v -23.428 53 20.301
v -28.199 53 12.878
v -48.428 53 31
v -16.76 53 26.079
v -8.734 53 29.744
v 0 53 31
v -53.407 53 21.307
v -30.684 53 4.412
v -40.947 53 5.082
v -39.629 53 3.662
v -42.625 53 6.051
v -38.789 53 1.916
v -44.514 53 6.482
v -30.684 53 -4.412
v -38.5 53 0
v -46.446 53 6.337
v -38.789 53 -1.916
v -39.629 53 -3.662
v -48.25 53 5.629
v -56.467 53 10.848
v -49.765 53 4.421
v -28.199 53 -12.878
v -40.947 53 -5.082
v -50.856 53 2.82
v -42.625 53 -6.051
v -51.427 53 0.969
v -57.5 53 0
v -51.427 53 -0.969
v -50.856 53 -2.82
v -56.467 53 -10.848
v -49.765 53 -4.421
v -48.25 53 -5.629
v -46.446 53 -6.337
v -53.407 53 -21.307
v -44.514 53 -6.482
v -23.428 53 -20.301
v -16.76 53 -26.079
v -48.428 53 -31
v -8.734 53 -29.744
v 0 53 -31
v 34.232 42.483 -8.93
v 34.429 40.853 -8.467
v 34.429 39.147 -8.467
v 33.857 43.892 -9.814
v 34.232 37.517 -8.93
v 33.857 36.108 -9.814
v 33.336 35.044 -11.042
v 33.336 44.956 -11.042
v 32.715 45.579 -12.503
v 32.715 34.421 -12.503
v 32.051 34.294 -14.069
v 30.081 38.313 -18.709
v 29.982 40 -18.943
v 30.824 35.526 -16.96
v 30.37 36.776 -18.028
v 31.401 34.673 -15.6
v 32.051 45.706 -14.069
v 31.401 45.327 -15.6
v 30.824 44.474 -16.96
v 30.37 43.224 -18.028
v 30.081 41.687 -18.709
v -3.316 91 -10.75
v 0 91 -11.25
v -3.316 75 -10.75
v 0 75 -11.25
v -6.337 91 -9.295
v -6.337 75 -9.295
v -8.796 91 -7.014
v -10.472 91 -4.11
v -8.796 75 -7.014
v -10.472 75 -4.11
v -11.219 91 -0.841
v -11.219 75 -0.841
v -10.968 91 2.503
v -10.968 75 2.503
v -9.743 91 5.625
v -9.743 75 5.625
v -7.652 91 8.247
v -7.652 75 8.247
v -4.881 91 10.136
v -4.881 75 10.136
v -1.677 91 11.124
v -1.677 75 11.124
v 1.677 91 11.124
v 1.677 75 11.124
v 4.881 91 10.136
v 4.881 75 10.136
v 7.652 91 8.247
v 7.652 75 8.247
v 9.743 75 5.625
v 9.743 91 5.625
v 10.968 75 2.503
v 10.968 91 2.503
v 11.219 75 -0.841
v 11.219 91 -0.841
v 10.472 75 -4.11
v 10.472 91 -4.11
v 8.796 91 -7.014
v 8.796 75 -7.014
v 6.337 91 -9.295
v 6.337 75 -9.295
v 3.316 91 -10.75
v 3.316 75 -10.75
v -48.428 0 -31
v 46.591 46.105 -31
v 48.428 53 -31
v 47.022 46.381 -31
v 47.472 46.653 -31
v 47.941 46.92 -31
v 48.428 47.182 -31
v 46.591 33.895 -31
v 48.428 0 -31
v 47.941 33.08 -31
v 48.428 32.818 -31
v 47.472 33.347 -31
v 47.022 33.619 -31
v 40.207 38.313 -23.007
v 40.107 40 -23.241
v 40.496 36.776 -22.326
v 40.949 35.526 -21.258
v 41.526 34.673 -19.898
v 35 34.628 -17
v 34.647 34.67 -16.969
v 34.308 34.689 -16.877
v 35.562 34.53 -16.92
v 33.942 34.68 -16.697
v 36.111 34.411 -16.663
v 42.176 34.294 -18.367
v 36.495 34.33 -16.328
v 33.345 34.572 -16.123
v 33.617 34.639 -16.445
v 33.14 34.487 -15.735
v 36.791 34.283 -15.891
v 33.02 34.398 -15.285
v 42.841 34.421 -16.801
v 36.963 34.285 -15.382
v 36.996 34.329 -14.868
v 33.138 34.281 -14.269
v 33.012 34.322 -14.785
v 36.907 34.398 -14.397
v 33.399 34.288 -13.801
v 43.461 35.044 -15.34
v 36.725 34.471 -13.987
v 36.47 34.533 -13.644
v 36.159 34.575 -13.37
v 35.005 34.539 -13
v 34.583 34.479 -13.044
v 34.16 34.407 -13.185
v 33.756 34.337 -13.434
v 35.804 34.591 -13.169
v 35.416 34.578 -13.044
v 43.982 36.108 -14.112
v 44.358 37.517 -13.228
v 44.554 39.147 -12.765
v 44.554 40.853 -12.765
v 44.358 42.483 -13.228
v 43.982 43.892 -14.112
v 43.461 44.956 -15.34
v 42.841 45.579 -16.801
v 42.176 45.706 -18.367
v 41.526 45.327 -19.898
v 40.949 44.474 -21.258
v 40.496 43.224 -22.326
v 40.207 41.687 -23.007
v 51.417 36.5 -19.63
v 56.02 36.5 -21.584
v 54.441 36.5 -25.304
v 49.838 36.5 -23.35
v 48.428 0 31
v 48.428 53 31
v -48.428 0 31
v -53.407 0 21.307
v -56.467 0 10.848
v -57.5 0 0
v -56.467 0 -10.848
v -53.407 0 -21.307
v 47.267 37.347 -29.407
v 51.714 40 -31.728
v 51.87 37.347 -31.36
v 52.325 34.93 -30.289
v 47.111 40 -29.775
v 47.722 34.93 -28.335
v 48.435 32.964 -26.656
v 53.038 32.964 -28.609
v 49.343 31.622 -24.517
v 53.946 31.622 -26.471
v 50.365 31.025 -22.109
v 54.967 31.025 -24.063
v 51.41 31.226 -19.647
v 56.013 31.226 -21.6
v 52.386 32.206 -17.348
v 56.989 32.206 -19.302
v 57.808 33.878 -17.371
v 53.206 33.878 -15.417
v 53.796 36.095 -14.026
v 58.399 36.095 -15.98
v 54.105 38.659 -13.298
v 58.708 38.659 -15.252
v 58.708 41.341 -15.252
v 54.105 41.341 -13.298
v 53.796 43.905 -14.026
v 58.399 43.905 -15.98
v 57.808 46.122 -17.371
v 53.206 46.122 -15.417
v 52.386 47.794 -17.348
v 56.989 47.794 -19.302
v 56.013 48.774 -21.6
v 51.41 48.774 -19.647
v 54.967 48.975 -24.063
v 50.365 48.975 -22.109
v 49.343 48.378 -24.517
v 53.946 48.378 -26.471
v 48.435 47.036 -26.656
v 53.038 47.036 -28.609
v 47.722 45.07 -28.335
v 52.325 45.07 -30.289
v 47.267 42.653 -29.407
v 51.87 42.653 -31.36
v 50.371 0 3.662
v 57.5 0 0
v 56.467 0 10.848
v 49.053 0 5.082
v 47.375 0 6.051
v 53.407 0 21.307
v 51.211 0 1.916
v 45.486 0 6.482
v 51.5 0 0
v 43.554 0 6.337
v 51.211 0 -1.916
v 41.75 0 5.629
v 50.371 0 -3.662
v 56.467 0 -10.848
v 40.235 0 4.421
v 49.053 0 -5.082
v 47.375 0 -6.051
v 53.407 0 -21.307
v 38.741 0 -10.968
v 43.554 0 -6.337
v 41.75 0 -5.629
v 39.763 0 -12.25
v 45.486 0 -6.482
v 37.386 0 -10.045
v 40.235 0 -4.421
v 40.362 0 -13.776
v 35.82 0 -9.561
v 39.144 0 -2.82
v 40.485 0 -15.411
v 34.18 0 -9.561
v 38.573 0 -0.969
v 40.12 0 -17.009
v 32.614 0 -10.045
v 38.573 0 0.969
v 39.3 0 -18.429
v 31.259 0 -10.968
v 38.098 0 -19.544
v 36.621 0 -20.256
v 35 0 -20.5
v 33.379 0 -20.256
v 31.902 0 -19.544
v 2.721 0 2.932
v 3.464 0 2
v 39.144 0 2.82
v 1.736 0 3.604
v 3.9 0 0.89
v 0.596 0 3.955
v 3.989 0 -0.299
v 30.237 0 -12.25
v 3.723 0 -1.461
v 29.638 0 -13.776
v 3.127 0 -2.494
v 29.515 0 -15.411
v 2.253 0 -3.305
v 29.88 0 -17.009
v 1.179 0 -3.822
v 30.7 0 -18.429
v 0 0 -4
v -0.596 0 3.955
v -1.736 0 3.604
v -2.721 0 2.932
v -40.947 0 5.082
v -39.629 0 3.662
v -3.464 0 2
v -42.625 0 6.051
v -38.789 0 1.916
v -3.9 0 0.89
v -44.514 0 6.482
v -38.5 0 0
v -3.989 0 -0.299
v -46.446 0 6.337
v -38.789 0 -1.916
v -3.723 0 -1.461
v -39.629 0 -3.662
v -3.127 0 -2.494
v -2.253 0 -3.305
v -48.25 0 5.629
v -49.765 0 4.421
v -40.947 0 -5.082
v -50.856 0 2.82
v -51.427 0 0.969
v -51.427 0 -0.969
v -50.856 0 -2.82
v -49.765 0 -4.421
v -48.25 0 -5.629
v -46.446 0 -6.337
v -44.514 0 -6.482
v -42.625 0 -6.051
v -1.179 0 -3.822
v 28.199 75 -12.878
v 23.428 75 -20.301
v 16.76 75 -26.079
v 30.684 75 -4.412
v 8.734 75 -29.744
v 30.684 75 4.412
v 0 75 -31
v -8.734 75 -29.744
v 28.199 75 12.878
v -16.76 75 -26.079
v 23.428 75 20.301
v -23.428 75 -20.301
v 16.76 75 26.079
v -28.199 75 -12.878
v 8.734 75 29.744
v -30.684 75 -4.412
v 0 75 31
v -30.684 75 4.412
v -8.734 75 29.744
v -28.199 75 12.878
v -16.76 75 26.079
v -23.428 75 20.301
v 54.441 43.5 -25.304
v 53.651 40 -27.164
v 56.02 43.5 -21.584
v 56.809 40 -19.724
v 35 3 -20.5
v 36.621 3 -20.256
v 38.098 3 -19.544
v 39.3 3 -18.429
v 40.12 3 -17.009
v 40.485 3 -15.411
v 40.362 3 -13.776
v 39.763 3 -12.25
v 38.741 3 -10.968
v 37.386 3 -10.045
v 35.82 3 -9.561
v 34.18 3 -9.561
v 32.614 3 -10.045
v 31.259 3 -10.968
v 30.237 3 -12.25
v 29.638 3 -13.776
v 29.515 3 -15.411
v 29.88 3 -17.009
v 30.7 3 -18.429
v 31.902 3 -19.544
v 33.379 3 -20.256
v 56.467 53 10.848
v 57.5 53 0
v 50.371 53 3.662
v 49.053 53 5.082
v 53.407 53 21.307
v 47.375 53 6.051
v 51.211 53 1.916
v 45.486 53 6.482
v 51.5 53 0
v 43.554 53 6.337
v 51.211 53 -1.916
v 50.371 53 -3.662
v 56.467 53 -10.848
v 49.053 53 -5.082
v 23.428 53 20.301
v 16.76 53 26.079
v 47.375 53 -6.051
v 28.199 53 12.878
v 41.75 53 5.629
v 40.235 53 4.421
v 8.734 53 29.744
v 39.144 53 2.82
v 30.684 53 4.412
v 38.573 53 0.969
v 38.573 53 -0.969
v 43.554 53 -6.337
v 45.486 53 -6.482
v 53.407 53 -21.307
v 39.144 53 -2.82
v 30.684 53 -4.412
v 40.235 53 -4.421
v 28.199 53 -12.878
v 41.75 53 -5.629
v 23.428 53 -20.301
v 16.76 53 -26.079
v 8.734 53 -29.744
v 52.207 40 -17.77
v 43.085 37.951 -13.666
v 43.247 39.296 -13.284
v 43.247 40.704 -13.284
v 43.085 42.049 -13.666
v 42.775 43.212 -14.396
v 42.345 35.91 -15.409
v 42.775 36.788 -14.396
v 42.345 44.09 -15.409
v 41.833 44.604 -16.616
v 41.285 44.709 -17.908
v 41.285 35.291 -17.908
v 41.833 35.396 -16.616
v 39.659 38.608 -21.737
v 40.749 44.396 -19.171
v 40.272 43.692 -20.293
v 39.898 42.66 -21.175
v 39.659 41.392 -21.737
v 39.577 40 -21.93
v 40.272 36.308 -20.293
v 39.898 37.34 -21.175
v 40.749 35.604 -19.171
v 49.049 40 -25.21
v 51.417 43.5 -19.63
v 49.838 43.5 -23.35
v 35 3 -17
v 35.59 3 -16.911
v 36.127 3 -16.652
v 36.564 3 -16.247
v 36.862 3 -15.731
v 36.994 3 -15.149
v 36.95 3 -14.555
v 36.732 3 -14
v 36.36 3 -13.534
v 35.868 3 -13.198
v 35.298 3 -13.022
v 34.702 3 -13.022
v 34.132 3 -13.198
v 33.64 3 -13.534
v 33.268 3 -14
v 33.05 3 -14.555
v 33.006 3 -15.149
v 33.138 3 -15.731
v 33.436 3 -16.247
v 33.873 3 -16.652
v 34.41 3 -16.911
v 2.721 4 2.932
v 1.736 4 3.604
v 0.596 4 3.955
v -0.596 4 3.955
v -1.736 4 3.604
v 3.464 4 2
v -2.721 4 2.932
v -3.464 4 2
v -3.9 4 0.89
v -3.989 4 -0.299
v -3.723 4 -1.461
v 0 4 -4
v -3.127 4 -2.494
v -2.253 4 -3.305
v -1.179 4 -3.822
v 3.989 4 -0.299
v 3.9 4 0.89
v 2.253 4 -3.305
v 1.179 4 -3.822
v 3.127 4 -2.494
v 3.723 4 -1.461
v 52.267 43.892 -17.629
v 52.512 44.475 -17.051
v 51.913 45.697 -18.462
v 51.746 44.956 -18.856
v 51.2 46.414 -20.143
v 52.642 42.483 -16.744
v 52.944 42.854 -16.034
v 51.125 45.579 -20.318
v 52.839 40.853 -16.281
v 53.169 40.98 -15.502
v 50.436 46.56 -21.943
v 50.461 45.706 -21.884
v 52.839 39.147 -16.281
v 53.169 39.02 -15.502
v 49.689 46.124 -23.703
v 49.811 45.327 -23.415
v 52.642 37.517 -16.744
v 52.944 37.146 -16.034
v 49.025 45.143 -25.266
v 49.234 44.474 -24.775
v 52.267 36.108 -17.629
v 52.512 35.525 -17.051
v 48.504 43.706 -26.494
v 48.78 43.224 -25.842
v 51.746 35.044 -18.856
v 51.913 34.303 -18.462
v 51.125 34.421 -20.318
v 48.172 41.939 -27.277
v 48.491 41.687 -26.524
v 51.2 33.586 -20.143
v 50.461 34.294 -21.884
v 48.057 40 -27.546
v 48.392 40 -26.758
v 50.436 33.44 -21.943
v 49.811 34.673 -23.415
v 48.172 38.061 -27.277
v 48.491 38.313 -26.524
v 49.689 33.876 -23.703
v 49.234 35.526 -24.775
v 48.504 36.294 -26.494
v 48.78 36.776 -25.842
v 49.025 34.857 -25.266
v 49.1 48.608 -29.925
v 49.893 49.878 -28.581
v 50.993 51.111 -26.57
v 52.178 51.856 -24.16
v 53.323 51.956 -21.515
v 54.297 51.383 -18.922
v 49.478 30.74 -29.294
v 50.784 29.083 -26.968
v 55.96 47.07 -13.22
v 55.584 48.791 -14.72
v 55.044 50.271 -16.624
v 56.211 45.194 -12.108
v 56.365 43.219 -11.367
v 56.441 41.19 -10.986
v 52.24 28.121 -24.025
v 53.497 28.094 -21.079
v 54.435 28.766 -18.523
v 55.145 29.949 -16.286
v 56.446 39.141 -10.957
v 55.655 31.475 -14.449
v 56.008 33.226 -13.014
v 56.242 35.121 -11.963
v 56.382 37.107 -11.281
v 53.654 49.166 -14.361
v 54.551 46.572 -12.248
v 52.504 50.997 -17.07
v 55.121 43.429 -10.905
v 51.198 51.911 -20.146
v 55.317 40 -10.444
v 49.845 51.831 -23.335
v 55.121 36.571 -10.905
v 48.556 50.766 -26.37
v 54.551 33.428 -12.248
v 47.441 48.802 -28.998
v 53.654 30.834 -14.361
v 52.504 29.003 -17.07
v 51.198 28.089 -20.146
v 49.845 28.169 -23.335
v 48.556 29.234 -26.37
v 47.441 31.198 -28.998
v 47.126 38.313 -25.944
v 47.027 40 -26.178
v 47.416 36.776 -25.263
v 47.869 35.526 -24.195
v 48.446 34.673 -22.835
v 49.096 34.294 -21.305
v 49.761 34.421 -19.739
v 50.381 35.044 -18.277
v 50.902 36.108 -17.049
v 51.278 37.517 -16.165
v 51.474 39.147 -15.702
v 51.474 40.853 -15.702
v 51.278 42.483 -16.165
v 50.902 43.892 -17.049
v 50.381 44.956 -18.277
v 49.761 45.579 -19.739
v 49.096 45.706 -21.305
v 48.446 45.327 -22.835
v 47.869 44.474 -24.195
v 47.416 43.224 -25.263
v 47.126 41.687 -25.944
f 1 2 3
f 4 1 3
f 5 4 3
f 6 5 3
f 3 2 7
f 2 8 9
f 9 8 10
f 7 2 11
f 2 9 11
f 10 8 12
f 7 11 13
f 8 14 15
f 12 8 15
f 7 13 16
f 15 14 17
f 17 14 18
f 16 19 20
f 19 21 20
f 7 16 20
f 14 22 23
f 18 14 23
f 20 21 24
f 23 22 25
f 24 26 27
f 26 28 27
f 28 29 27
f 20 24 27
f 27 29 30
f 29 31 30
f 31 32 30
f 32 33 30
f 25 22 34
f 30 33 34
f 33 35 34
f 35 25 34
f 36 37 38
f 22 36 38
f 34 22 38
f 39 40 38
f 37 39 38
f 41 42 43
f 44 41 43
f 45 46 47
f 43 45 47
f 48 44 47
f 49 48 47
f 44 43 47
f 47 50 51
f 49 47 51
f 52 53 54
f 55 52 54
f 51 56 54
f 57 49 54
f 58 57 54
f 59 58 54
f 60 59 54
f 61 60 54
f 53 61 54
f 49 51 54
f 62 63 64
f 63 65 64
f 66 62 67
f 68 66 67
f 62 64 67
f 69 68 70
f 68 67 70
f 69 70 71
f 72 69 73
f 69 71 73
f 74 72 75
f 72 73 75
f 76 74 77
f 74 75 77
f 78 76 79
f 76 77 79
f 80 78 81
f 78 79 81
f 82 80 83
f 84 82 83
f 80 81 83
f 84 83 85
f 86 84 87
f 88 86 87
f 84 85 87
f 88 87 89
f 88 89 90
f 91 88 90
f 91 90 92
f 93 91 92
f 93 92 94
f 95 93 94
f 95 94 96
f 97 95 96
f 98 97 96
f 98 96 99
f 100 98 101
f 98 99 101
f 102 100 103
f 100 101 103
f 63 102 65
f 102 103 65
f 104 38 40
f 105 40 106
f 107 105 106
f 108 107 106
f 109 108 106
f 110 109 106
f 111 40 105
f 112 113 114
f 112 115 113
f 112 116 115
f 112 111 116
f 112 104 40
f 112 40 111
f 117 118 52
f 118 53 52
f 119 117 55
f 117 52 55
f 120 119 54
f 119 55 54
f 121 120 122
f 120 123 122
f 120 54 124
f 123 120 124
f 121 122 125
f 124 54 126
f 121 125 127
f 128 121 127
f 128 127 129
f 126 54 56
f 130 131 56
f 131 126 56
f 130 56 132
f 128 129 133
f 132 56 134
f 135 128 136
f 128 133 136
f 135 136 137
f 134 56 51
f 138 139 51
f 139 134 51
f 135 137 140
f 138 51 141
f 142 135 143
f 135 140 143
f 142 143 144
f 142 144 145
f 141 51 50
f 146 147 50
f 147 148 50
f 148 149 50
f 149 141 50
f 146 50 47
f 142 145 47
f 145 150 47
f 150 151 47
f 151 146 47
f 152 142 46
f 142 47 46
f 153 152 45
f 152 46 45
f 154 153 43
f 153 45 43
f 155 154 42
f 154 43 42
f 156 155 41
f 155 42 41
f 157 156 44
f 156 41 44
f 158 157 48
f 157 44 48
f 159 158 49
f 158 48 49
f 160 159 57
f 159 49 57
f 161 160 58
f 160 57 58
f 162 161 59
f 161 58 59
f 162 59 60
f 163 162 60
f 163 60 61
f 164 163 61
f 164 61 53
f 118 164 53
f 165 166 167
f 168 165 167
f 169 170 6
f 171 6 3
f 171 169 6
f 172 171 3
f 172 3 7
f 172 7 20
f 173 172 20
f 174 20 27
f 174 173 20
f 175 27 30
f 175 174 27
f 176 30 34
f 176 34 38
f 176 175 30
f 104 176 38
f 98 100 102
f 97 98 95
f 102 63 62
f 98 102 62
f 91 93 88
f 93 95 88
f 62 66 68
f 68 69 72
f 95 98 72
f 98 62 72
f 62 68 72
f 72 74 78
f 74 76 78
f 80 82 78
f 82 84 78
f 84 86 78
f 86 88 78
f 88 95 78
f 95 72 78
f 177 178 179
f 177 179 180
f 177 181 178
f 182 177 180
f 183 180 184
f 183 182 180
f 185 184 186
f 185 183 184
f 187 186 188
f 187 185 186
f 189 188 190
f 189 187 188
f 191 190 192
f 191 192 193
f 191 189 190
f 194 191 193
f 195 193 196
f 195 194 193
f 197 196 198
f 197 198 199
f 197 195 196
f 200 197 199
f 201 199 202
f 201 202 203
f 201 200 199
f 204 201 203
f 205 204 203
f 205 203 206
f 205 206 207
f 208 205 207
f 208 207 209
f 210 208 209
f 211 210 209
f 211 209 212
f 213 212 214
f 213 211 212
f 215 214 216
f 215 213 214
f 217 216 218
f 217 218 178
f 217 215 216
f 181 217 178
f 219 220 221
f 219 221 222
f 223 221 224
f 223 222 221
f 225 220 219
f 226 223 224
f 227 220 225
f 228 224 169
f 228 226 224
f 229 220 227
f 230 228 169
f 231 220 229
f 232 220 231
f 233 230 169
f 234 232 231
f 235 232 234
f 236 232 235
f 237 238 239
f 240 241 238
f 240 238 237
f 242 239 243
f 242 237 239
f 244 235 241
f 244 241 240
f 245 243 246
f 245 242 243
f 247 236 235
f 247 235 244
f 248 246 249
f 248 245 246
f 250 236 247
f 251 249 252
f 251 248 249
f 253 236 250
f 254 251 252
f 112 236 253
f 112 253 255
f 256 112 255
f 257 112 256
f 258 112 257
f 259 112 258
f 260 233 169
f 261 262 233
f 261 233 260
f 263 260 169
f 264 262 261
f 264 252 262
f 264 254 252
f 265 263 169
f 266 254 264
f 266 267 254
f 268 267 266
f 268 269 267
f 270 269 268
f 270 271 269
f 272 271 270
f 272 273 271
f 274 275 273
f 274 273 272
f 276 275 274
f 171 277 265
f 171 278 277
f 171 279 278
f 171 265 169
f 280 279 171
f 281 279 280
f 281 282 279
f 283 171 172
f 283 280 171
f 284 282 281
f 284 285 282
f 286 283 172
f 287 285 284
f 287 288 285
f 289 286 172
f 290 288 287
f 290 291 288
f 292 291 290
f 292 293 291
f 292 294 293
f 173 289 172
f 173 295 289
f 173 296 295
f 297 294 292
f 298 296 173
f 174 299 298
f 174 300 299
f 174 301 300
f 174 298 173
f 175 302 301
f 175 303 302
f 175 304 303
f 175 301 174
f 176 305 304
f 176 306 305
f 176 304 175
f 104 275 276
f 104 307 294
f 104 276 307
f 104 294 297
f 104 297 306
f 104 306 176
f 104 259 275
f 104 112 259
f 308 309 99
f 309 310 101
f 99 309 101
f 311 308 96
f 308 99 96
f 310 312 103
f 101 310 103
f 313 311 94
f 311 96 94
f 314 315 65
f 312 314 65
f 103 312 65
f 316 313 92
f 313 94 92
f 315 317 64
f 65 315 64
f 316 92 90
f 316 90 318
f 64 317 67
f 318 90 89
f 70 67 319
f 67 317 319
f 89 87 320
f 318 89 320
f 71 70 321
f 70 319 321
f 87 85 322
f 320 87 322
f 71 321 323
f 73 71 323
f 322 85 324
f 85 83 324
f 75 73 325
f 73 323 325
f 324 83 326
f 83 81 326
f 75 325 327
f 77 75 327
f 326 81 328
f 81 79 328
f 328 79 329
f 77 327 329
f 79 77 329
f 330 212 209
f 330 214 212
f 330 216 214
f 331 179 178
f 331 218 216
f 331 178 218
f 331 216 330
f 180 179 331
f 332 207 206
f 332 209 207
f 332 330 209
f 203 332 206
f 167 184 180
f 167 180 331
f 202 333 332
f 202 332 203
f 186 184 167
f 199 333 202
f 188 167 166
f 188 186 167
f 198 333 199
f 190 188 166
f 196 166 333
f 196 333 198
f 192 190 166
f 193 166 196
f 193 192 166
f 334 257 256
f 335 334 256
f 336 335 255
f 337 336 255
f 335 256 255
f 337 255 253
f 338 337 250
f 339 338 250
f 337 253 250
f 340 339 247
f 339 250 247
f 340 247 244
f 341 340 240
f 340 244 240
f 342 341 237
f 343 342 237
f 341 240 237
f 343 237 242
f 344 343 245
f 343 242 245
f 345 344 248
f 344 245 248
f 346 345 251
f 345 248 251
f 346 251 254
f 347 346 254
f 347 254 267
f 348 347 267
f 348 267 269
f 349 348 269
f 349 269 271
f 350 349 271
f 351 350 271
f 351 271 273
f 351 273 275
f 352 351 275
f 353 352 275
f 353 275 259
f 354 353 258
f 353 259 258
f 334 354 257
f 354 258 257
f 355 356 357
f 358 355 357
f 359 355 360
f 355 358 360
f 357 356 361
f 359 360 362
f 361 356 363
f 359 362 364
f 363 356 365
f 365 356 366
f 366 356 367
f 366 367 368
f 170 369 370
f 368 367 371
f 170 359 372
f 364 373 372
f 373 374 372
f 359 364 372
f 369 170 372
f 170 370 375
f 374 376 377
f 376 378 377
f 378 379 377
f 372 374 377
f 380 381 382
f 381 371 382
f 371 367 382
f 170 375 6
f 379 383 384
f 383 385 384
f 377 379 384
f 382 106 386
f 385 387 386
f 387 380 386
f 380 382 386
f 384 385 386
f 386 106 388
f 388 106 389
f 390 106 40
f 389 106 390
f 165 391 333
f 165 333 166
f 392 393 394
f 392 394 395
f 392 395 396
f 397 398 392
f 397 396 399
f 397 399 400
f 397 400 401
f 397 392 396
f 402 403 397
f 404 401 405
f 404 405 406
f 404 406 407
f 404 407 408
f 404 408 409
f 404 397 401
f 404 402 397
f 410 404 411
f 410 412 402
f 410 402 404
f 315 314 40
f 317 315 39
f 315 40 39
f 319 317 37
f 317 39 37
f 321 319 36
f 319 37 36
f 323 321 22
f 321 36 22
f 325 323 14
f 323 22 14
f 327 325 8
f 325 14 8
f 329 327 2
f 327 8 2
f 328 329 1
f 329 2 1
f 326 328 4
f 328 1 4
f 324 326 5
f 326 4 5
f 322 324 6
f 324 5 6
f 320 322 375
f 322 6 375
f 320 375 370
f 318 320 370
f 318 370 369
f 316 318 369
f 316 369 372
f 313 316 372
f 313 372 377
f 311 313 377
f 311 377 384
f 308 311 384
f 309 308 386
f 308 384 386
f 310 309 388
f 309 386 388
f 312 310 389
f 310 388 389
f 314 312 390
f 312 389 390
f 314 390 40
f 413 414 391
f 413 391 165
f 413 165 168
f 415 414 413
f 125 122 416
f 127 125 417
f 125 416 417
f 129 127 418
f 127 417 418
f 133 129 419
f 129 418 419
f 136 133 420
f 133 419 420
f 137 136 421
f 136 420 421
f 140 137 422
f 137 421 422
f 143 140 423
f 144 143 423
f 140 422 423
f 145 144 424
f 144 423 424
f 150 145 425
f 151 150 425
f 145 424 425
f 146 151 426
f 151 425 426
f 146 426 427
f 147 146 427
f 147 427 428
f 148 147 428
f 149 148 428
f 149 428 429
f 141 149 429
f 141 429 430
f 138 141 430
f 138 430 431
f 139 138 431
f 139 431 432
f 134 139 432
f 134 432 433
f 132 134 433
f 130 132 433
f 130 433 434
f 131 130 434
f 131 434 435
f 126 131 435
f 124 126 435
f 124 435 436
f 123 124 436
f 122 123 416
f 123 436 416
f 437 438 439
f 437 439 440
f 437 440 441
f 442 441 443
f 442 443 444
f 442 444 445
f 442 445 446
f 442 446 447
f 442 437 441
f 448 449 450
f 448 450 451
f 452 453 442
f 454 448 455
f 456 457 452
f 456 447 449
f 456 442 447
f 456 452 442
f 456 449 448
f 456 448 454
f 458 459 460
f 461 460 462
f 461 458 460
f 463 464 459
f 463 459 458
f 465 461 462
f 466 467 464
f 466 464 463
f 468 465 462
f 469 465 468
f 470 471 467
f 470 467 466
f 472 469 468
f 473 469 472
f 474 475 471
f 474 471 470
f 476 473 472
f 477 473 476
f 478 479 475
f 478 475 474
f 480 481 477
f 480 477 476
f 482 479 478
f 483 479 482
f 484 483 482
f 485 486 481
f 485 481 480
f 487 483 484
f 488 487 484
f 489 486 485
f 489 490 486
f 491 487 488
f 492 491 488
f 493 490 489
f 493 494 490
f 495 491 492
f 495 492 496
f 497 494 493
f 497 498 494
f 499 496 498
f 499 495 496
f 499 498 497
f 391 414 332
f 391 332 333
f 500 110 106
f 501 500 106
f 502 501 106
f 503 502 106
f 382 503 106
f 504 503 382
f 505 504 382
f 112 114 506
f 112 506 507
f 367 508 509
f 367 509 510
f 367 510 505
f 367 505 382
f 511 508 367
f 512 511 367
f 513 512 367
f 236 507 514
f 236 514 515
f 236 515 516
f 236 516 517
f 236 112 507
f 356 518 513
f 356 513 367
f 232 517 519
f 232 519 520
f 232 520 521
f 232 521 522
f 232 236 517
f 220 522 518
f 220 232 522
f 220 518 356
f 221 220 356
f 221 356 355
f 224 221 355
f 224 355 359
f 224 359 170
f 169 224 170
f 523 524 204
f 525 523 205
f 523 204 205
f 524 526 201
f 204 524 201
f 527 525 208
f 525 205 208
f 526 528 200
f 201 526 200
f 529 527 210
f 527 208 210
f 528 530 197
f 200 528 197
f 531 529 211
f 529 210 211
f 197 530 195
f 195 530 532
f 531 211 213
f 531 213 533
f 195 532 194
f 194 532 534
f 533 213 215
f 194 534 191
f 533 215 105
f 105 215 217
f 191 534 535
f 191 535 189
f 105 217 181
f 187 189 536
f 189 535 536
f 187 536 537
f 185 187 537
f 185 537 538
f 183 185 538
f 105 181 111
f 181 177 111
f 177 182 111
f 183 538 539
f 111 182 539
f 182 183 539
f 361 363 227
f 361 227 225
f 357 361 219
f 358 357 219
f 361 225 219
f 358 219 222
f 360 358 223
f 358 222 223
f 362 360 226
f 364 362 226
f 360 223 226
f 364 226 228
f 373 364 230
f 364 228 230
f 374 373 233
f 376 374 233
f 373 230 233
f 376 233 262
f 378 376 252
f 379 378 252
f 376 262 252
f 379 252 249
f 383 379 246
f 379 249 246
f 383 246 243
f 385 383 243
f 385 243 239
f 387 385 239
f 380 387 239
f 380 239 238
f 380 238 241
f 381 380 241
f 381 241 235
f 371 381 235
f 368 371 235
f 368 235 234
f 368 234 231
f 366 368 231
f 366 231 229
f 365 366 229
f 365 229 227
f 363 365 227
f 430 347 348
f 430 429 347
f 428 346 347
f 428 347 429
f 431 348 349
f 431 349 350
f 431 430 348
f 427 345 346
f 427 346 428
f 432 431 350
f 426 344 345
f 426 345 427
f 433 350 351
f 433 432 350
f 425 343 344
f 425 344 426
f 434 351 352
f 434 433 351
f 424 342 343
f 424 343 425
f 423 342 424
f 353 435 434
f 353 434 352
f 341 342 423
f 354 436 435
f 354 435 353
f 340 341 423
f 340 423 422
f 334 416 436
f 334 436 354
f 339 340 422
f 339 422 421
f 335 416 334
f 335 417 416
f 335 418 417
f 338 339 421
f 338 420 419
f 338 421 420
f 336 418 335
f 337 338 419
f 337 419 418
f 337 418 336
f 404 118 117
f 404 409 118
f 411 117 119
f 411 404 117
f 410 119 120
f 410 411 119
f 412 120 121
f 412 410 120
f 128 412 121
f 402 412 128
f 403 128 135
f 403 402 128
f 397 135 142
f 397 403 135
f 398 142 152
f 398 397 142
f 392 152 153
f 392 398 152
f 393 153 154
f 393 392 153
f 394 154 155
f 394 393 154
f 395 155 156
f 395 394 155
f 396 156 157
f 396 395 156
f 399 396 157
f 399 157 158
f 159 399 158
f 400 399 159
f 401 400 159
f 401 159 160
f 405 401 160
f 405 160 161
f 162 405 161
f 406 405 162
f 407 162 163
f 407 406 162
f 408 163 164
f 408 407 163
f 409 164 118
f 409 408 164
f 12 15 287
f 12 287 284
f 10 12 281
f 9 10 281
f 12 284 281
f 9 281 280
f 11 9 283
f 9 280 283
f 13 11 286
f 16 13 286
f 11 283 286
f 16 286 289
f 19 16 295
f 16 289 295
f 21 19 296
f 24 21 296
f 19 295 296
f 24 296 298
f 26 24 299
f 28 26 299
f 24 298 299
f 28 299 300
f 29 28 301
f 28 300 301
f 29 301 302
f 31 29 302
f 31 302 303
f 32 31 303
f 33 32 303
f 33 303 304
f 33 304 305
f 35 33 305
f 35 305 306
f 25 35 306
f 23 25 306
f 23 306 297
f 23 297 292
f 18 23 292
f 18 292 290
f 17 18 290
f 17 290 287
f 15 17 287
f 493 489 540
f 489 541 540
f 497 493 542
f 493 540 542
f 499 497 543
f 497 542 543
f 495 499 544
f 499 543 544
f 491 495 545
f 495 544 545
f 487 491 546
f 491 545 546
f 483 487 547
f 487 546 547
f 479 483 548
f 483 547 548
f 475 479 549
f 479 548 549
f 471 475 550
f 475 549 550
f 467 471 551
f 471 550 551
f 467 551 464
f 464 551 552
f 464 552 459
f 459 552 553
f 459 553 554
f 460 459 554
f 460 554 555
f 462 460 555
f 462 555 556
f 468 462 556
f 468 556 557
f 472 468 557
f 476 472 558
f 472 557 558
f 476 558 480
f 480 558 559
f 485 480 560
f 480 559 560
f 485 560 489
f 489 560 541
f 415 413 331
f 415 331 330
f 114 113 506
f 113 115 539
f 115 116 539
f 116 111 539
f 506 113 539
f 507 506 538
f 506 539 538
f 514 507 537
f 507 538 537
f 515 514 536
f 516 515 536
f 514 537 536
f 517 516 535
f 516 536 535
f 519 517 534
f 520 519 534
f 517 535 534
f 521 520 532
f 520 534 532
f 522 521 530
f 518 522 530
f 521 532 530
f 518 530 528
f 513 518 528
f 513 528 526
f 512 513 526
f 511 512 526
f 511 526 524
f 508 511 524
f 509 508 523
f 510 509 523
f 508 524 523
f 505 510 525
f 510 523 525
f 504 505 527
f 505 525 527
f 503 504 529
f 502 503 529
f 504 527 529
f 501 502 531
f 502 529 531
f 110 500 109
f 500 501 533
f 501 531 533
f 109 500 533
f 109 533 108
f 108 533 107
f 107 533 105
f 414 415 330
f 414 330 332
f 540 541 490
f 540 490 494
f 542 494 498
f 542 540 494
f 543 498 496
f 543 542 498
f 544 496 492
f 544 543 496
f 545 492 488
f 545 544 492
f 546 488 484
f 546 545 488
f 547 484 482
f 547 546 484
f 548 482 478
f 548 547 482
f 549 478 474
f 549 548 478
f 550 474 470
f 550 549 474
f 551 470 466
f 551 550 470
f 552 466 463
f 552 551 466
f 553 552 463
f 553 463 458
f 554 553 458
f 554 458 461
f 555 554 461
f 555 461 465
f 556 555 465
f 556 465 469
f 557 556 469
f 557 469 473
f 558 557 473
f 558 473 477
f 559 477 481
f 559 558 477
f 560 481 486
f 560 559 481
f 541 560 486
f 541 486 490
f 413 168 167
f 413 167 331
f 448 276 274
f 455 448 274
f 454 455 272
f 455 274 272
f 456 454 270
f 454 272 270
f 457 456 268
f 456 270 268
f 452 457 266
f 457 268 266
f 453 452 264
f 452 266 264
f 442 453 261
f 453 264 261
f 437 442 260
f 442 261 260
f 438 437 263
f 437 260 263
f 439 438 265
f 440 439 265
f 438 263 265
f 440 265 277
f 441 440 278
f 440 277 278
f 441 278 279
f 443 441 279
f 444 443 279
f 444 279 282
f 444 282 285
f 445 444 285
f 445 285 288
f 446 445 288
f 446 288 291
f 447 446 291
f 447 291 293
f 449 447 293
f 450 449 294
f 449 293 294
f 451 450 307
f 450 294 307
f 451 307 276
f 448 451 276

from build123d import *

# Parameters (mm, degrees)
EXTRUDE1_DEPTH     = 53
HOLE1_D            = 13
HOLE1_DEPTH        = 53
SKETCH5_R          = 4
CUT_EXTRUDE1_DEPTH = 4
SKETCH6_R          = 5.5
CUT_EXTRUDE2_DEPTH = 3
SKETCH7_R          = 2
CUT_EXTRUDE3_DEPTH = 33
CUT_EXTRUDE4_DEPTH = 5


with BuildPart() as part:
    # Sketch1 → Extrude1 (new body)
    with BuildSketch(Plane(origin=(0, 0, 0), x_dir=(1, 0, 0), z_dir=(0, 1, 0))):
        with BuildLine():
            Line((-48.427781283, 31), (48.427781283, 31))
            ThreePointArc((48.427781283, 31), (57.5, 0), (48.427781283, -31))
            Line((48.427781283, -31), (-48.427781283, -31))
            ThreePointArc((-48.427781283, -31), (-57.5, 0), (-48.427781283, 31))
        make_face()
    extrude(amount=EXTRUDE1_DEPTH)

    # Sketch2 → Revolve1 (revolve)
    with BuildSketch(Plane.XY, mode=Mode.PRIVATE) as revolve1_sk:
        Polygon((0, 91), (-11.25, 91), (-11.25, 75), (-31, 75), (-31, 53), (0, 53), align=None)
    revolve(revolve1_sk.sketch.rotate(Axis((0, 0, 0), (0, 1, 0)), 270), axis=Axis((0, 0, 0), (0, 1, 0)))  # turned: the seam where the file's is

    # Hole1
    with Locations(Plane(origin=(0, 53, 0), x_dir=(-1, 0, 0), z_dir=(0, 1, 0))):
        with Locations((45, 0), (-45, 0)):
            Hole(HOLE1_D / 2, depth=HOLE1_DEPTH)

    # Sketch5 → Cut-Extrude1 (cut)
    with BuildSketch(Plane.XZ):
        with Locations(Location((0, 0, 0), (0, 0, 270))):  # turned: the seam where the file's is
            Circle(SKETCH5_R)
    extrude(amount=-CUT_EXTRUDE1_DEPTH, mode=Mode.SUBTRACT)

    # Sketch6 → Cut-Extrude2 (cut)
    with BuildSketch(Plane.XZ):
        with Locations(Location((35, -15, 0), (0, 0, 270))):  # turned: the seam where the file's is
            Circle(SKETCH6_R)
    extrude(amount=-CUT_EXTRUDE2_DEPTH, mode=Mode.SUBTRACT)

    # Sketch7 → Cut-Extrude3 (cut)
    with BuildSketch(Plane.XZ.offset(-3)):
        with Locations(Location((35, -15, 0), (0, 0, 270))):  # turned: the seam where the file's is
            Circle(SKETCH7_R)
    extrude(amount=-CUT_EXTRUDE3_DEPTH, mode=Mode.SUBTRACT)

    # Sketch8 → Cut-Revolve1 (revolve, cut)
    with BuildSketch(Plane(origin=(0, 0, 0), x_dir=(0.920504853, 0, -0.390731128), z_dir=(0.390731128, 0, 0.920504853)), mode=Mode.PRIVATE) as cut_revolve1_sk:
        Polygon((57.5, 28), (55, 28), (55, 33.4215), (53.517364509, 34.2775), (35, 34.2775), (35, 40), (57.5, 40), align=None)
    revolve(cut_revolve1_sk.sketch.rotate(Axis((47.484793311, 40, -20.156098913), (-0.920504853, 0, 0.390731128)), 270), axis=Axis((47.484793311, 40, -20.156098913), (-0.920504853, 0, 0.390731128)), mode=Mode.SUBTRACT)  # turned: the seam where the file's is

    # Sketch9 → Revolve2 (revolve)
    with BuildSketch(Plane(origin=(0, 0, 0), x_dir=(0.920504853, 0, -0.390731128), z_dir=(0.390731128, 0, 0.920504853)), mode=Mode.PRIVATE) as revolve2_sk:
        Polygon((55, 31), (55, 34.2775), (46, 34.2775), (45, 35.2775), (45, 40), (60, 40), (60, 31), align=None)
    revolve(revolve2_sk.sketch.rotate(Axis((68.658528533, 40, -29.14381628), (-0.920504853, 0, 0.390731128)), 270), axis=Axis((68.658528533, 40, -29.14381628), (-0.920504853, 0, 0.390731128)))  # turned: the seam where the file's is

    # Sketch10 → Cut-Extrude4 (cut)
    with BuildSketch(Plane(origin=(55.230291207, 0, -23.443867709), x_dir=(-0.390731128, 0, -0.920504853), z_dir=(0.920504853, 0, -0.390731128))):
        Polygon((4.041451884, 40), (2.020725942, 43.5), (-2.020725942, 43.5), (-4.041451884, 40), (-2.020725942, 36.5), (2.020725942, 36.5), align=None)
    extrude(amount=-CUT_EXTRUDE4_DEPTH, mode=Mode.SUBTRACT)


solid = part.part
